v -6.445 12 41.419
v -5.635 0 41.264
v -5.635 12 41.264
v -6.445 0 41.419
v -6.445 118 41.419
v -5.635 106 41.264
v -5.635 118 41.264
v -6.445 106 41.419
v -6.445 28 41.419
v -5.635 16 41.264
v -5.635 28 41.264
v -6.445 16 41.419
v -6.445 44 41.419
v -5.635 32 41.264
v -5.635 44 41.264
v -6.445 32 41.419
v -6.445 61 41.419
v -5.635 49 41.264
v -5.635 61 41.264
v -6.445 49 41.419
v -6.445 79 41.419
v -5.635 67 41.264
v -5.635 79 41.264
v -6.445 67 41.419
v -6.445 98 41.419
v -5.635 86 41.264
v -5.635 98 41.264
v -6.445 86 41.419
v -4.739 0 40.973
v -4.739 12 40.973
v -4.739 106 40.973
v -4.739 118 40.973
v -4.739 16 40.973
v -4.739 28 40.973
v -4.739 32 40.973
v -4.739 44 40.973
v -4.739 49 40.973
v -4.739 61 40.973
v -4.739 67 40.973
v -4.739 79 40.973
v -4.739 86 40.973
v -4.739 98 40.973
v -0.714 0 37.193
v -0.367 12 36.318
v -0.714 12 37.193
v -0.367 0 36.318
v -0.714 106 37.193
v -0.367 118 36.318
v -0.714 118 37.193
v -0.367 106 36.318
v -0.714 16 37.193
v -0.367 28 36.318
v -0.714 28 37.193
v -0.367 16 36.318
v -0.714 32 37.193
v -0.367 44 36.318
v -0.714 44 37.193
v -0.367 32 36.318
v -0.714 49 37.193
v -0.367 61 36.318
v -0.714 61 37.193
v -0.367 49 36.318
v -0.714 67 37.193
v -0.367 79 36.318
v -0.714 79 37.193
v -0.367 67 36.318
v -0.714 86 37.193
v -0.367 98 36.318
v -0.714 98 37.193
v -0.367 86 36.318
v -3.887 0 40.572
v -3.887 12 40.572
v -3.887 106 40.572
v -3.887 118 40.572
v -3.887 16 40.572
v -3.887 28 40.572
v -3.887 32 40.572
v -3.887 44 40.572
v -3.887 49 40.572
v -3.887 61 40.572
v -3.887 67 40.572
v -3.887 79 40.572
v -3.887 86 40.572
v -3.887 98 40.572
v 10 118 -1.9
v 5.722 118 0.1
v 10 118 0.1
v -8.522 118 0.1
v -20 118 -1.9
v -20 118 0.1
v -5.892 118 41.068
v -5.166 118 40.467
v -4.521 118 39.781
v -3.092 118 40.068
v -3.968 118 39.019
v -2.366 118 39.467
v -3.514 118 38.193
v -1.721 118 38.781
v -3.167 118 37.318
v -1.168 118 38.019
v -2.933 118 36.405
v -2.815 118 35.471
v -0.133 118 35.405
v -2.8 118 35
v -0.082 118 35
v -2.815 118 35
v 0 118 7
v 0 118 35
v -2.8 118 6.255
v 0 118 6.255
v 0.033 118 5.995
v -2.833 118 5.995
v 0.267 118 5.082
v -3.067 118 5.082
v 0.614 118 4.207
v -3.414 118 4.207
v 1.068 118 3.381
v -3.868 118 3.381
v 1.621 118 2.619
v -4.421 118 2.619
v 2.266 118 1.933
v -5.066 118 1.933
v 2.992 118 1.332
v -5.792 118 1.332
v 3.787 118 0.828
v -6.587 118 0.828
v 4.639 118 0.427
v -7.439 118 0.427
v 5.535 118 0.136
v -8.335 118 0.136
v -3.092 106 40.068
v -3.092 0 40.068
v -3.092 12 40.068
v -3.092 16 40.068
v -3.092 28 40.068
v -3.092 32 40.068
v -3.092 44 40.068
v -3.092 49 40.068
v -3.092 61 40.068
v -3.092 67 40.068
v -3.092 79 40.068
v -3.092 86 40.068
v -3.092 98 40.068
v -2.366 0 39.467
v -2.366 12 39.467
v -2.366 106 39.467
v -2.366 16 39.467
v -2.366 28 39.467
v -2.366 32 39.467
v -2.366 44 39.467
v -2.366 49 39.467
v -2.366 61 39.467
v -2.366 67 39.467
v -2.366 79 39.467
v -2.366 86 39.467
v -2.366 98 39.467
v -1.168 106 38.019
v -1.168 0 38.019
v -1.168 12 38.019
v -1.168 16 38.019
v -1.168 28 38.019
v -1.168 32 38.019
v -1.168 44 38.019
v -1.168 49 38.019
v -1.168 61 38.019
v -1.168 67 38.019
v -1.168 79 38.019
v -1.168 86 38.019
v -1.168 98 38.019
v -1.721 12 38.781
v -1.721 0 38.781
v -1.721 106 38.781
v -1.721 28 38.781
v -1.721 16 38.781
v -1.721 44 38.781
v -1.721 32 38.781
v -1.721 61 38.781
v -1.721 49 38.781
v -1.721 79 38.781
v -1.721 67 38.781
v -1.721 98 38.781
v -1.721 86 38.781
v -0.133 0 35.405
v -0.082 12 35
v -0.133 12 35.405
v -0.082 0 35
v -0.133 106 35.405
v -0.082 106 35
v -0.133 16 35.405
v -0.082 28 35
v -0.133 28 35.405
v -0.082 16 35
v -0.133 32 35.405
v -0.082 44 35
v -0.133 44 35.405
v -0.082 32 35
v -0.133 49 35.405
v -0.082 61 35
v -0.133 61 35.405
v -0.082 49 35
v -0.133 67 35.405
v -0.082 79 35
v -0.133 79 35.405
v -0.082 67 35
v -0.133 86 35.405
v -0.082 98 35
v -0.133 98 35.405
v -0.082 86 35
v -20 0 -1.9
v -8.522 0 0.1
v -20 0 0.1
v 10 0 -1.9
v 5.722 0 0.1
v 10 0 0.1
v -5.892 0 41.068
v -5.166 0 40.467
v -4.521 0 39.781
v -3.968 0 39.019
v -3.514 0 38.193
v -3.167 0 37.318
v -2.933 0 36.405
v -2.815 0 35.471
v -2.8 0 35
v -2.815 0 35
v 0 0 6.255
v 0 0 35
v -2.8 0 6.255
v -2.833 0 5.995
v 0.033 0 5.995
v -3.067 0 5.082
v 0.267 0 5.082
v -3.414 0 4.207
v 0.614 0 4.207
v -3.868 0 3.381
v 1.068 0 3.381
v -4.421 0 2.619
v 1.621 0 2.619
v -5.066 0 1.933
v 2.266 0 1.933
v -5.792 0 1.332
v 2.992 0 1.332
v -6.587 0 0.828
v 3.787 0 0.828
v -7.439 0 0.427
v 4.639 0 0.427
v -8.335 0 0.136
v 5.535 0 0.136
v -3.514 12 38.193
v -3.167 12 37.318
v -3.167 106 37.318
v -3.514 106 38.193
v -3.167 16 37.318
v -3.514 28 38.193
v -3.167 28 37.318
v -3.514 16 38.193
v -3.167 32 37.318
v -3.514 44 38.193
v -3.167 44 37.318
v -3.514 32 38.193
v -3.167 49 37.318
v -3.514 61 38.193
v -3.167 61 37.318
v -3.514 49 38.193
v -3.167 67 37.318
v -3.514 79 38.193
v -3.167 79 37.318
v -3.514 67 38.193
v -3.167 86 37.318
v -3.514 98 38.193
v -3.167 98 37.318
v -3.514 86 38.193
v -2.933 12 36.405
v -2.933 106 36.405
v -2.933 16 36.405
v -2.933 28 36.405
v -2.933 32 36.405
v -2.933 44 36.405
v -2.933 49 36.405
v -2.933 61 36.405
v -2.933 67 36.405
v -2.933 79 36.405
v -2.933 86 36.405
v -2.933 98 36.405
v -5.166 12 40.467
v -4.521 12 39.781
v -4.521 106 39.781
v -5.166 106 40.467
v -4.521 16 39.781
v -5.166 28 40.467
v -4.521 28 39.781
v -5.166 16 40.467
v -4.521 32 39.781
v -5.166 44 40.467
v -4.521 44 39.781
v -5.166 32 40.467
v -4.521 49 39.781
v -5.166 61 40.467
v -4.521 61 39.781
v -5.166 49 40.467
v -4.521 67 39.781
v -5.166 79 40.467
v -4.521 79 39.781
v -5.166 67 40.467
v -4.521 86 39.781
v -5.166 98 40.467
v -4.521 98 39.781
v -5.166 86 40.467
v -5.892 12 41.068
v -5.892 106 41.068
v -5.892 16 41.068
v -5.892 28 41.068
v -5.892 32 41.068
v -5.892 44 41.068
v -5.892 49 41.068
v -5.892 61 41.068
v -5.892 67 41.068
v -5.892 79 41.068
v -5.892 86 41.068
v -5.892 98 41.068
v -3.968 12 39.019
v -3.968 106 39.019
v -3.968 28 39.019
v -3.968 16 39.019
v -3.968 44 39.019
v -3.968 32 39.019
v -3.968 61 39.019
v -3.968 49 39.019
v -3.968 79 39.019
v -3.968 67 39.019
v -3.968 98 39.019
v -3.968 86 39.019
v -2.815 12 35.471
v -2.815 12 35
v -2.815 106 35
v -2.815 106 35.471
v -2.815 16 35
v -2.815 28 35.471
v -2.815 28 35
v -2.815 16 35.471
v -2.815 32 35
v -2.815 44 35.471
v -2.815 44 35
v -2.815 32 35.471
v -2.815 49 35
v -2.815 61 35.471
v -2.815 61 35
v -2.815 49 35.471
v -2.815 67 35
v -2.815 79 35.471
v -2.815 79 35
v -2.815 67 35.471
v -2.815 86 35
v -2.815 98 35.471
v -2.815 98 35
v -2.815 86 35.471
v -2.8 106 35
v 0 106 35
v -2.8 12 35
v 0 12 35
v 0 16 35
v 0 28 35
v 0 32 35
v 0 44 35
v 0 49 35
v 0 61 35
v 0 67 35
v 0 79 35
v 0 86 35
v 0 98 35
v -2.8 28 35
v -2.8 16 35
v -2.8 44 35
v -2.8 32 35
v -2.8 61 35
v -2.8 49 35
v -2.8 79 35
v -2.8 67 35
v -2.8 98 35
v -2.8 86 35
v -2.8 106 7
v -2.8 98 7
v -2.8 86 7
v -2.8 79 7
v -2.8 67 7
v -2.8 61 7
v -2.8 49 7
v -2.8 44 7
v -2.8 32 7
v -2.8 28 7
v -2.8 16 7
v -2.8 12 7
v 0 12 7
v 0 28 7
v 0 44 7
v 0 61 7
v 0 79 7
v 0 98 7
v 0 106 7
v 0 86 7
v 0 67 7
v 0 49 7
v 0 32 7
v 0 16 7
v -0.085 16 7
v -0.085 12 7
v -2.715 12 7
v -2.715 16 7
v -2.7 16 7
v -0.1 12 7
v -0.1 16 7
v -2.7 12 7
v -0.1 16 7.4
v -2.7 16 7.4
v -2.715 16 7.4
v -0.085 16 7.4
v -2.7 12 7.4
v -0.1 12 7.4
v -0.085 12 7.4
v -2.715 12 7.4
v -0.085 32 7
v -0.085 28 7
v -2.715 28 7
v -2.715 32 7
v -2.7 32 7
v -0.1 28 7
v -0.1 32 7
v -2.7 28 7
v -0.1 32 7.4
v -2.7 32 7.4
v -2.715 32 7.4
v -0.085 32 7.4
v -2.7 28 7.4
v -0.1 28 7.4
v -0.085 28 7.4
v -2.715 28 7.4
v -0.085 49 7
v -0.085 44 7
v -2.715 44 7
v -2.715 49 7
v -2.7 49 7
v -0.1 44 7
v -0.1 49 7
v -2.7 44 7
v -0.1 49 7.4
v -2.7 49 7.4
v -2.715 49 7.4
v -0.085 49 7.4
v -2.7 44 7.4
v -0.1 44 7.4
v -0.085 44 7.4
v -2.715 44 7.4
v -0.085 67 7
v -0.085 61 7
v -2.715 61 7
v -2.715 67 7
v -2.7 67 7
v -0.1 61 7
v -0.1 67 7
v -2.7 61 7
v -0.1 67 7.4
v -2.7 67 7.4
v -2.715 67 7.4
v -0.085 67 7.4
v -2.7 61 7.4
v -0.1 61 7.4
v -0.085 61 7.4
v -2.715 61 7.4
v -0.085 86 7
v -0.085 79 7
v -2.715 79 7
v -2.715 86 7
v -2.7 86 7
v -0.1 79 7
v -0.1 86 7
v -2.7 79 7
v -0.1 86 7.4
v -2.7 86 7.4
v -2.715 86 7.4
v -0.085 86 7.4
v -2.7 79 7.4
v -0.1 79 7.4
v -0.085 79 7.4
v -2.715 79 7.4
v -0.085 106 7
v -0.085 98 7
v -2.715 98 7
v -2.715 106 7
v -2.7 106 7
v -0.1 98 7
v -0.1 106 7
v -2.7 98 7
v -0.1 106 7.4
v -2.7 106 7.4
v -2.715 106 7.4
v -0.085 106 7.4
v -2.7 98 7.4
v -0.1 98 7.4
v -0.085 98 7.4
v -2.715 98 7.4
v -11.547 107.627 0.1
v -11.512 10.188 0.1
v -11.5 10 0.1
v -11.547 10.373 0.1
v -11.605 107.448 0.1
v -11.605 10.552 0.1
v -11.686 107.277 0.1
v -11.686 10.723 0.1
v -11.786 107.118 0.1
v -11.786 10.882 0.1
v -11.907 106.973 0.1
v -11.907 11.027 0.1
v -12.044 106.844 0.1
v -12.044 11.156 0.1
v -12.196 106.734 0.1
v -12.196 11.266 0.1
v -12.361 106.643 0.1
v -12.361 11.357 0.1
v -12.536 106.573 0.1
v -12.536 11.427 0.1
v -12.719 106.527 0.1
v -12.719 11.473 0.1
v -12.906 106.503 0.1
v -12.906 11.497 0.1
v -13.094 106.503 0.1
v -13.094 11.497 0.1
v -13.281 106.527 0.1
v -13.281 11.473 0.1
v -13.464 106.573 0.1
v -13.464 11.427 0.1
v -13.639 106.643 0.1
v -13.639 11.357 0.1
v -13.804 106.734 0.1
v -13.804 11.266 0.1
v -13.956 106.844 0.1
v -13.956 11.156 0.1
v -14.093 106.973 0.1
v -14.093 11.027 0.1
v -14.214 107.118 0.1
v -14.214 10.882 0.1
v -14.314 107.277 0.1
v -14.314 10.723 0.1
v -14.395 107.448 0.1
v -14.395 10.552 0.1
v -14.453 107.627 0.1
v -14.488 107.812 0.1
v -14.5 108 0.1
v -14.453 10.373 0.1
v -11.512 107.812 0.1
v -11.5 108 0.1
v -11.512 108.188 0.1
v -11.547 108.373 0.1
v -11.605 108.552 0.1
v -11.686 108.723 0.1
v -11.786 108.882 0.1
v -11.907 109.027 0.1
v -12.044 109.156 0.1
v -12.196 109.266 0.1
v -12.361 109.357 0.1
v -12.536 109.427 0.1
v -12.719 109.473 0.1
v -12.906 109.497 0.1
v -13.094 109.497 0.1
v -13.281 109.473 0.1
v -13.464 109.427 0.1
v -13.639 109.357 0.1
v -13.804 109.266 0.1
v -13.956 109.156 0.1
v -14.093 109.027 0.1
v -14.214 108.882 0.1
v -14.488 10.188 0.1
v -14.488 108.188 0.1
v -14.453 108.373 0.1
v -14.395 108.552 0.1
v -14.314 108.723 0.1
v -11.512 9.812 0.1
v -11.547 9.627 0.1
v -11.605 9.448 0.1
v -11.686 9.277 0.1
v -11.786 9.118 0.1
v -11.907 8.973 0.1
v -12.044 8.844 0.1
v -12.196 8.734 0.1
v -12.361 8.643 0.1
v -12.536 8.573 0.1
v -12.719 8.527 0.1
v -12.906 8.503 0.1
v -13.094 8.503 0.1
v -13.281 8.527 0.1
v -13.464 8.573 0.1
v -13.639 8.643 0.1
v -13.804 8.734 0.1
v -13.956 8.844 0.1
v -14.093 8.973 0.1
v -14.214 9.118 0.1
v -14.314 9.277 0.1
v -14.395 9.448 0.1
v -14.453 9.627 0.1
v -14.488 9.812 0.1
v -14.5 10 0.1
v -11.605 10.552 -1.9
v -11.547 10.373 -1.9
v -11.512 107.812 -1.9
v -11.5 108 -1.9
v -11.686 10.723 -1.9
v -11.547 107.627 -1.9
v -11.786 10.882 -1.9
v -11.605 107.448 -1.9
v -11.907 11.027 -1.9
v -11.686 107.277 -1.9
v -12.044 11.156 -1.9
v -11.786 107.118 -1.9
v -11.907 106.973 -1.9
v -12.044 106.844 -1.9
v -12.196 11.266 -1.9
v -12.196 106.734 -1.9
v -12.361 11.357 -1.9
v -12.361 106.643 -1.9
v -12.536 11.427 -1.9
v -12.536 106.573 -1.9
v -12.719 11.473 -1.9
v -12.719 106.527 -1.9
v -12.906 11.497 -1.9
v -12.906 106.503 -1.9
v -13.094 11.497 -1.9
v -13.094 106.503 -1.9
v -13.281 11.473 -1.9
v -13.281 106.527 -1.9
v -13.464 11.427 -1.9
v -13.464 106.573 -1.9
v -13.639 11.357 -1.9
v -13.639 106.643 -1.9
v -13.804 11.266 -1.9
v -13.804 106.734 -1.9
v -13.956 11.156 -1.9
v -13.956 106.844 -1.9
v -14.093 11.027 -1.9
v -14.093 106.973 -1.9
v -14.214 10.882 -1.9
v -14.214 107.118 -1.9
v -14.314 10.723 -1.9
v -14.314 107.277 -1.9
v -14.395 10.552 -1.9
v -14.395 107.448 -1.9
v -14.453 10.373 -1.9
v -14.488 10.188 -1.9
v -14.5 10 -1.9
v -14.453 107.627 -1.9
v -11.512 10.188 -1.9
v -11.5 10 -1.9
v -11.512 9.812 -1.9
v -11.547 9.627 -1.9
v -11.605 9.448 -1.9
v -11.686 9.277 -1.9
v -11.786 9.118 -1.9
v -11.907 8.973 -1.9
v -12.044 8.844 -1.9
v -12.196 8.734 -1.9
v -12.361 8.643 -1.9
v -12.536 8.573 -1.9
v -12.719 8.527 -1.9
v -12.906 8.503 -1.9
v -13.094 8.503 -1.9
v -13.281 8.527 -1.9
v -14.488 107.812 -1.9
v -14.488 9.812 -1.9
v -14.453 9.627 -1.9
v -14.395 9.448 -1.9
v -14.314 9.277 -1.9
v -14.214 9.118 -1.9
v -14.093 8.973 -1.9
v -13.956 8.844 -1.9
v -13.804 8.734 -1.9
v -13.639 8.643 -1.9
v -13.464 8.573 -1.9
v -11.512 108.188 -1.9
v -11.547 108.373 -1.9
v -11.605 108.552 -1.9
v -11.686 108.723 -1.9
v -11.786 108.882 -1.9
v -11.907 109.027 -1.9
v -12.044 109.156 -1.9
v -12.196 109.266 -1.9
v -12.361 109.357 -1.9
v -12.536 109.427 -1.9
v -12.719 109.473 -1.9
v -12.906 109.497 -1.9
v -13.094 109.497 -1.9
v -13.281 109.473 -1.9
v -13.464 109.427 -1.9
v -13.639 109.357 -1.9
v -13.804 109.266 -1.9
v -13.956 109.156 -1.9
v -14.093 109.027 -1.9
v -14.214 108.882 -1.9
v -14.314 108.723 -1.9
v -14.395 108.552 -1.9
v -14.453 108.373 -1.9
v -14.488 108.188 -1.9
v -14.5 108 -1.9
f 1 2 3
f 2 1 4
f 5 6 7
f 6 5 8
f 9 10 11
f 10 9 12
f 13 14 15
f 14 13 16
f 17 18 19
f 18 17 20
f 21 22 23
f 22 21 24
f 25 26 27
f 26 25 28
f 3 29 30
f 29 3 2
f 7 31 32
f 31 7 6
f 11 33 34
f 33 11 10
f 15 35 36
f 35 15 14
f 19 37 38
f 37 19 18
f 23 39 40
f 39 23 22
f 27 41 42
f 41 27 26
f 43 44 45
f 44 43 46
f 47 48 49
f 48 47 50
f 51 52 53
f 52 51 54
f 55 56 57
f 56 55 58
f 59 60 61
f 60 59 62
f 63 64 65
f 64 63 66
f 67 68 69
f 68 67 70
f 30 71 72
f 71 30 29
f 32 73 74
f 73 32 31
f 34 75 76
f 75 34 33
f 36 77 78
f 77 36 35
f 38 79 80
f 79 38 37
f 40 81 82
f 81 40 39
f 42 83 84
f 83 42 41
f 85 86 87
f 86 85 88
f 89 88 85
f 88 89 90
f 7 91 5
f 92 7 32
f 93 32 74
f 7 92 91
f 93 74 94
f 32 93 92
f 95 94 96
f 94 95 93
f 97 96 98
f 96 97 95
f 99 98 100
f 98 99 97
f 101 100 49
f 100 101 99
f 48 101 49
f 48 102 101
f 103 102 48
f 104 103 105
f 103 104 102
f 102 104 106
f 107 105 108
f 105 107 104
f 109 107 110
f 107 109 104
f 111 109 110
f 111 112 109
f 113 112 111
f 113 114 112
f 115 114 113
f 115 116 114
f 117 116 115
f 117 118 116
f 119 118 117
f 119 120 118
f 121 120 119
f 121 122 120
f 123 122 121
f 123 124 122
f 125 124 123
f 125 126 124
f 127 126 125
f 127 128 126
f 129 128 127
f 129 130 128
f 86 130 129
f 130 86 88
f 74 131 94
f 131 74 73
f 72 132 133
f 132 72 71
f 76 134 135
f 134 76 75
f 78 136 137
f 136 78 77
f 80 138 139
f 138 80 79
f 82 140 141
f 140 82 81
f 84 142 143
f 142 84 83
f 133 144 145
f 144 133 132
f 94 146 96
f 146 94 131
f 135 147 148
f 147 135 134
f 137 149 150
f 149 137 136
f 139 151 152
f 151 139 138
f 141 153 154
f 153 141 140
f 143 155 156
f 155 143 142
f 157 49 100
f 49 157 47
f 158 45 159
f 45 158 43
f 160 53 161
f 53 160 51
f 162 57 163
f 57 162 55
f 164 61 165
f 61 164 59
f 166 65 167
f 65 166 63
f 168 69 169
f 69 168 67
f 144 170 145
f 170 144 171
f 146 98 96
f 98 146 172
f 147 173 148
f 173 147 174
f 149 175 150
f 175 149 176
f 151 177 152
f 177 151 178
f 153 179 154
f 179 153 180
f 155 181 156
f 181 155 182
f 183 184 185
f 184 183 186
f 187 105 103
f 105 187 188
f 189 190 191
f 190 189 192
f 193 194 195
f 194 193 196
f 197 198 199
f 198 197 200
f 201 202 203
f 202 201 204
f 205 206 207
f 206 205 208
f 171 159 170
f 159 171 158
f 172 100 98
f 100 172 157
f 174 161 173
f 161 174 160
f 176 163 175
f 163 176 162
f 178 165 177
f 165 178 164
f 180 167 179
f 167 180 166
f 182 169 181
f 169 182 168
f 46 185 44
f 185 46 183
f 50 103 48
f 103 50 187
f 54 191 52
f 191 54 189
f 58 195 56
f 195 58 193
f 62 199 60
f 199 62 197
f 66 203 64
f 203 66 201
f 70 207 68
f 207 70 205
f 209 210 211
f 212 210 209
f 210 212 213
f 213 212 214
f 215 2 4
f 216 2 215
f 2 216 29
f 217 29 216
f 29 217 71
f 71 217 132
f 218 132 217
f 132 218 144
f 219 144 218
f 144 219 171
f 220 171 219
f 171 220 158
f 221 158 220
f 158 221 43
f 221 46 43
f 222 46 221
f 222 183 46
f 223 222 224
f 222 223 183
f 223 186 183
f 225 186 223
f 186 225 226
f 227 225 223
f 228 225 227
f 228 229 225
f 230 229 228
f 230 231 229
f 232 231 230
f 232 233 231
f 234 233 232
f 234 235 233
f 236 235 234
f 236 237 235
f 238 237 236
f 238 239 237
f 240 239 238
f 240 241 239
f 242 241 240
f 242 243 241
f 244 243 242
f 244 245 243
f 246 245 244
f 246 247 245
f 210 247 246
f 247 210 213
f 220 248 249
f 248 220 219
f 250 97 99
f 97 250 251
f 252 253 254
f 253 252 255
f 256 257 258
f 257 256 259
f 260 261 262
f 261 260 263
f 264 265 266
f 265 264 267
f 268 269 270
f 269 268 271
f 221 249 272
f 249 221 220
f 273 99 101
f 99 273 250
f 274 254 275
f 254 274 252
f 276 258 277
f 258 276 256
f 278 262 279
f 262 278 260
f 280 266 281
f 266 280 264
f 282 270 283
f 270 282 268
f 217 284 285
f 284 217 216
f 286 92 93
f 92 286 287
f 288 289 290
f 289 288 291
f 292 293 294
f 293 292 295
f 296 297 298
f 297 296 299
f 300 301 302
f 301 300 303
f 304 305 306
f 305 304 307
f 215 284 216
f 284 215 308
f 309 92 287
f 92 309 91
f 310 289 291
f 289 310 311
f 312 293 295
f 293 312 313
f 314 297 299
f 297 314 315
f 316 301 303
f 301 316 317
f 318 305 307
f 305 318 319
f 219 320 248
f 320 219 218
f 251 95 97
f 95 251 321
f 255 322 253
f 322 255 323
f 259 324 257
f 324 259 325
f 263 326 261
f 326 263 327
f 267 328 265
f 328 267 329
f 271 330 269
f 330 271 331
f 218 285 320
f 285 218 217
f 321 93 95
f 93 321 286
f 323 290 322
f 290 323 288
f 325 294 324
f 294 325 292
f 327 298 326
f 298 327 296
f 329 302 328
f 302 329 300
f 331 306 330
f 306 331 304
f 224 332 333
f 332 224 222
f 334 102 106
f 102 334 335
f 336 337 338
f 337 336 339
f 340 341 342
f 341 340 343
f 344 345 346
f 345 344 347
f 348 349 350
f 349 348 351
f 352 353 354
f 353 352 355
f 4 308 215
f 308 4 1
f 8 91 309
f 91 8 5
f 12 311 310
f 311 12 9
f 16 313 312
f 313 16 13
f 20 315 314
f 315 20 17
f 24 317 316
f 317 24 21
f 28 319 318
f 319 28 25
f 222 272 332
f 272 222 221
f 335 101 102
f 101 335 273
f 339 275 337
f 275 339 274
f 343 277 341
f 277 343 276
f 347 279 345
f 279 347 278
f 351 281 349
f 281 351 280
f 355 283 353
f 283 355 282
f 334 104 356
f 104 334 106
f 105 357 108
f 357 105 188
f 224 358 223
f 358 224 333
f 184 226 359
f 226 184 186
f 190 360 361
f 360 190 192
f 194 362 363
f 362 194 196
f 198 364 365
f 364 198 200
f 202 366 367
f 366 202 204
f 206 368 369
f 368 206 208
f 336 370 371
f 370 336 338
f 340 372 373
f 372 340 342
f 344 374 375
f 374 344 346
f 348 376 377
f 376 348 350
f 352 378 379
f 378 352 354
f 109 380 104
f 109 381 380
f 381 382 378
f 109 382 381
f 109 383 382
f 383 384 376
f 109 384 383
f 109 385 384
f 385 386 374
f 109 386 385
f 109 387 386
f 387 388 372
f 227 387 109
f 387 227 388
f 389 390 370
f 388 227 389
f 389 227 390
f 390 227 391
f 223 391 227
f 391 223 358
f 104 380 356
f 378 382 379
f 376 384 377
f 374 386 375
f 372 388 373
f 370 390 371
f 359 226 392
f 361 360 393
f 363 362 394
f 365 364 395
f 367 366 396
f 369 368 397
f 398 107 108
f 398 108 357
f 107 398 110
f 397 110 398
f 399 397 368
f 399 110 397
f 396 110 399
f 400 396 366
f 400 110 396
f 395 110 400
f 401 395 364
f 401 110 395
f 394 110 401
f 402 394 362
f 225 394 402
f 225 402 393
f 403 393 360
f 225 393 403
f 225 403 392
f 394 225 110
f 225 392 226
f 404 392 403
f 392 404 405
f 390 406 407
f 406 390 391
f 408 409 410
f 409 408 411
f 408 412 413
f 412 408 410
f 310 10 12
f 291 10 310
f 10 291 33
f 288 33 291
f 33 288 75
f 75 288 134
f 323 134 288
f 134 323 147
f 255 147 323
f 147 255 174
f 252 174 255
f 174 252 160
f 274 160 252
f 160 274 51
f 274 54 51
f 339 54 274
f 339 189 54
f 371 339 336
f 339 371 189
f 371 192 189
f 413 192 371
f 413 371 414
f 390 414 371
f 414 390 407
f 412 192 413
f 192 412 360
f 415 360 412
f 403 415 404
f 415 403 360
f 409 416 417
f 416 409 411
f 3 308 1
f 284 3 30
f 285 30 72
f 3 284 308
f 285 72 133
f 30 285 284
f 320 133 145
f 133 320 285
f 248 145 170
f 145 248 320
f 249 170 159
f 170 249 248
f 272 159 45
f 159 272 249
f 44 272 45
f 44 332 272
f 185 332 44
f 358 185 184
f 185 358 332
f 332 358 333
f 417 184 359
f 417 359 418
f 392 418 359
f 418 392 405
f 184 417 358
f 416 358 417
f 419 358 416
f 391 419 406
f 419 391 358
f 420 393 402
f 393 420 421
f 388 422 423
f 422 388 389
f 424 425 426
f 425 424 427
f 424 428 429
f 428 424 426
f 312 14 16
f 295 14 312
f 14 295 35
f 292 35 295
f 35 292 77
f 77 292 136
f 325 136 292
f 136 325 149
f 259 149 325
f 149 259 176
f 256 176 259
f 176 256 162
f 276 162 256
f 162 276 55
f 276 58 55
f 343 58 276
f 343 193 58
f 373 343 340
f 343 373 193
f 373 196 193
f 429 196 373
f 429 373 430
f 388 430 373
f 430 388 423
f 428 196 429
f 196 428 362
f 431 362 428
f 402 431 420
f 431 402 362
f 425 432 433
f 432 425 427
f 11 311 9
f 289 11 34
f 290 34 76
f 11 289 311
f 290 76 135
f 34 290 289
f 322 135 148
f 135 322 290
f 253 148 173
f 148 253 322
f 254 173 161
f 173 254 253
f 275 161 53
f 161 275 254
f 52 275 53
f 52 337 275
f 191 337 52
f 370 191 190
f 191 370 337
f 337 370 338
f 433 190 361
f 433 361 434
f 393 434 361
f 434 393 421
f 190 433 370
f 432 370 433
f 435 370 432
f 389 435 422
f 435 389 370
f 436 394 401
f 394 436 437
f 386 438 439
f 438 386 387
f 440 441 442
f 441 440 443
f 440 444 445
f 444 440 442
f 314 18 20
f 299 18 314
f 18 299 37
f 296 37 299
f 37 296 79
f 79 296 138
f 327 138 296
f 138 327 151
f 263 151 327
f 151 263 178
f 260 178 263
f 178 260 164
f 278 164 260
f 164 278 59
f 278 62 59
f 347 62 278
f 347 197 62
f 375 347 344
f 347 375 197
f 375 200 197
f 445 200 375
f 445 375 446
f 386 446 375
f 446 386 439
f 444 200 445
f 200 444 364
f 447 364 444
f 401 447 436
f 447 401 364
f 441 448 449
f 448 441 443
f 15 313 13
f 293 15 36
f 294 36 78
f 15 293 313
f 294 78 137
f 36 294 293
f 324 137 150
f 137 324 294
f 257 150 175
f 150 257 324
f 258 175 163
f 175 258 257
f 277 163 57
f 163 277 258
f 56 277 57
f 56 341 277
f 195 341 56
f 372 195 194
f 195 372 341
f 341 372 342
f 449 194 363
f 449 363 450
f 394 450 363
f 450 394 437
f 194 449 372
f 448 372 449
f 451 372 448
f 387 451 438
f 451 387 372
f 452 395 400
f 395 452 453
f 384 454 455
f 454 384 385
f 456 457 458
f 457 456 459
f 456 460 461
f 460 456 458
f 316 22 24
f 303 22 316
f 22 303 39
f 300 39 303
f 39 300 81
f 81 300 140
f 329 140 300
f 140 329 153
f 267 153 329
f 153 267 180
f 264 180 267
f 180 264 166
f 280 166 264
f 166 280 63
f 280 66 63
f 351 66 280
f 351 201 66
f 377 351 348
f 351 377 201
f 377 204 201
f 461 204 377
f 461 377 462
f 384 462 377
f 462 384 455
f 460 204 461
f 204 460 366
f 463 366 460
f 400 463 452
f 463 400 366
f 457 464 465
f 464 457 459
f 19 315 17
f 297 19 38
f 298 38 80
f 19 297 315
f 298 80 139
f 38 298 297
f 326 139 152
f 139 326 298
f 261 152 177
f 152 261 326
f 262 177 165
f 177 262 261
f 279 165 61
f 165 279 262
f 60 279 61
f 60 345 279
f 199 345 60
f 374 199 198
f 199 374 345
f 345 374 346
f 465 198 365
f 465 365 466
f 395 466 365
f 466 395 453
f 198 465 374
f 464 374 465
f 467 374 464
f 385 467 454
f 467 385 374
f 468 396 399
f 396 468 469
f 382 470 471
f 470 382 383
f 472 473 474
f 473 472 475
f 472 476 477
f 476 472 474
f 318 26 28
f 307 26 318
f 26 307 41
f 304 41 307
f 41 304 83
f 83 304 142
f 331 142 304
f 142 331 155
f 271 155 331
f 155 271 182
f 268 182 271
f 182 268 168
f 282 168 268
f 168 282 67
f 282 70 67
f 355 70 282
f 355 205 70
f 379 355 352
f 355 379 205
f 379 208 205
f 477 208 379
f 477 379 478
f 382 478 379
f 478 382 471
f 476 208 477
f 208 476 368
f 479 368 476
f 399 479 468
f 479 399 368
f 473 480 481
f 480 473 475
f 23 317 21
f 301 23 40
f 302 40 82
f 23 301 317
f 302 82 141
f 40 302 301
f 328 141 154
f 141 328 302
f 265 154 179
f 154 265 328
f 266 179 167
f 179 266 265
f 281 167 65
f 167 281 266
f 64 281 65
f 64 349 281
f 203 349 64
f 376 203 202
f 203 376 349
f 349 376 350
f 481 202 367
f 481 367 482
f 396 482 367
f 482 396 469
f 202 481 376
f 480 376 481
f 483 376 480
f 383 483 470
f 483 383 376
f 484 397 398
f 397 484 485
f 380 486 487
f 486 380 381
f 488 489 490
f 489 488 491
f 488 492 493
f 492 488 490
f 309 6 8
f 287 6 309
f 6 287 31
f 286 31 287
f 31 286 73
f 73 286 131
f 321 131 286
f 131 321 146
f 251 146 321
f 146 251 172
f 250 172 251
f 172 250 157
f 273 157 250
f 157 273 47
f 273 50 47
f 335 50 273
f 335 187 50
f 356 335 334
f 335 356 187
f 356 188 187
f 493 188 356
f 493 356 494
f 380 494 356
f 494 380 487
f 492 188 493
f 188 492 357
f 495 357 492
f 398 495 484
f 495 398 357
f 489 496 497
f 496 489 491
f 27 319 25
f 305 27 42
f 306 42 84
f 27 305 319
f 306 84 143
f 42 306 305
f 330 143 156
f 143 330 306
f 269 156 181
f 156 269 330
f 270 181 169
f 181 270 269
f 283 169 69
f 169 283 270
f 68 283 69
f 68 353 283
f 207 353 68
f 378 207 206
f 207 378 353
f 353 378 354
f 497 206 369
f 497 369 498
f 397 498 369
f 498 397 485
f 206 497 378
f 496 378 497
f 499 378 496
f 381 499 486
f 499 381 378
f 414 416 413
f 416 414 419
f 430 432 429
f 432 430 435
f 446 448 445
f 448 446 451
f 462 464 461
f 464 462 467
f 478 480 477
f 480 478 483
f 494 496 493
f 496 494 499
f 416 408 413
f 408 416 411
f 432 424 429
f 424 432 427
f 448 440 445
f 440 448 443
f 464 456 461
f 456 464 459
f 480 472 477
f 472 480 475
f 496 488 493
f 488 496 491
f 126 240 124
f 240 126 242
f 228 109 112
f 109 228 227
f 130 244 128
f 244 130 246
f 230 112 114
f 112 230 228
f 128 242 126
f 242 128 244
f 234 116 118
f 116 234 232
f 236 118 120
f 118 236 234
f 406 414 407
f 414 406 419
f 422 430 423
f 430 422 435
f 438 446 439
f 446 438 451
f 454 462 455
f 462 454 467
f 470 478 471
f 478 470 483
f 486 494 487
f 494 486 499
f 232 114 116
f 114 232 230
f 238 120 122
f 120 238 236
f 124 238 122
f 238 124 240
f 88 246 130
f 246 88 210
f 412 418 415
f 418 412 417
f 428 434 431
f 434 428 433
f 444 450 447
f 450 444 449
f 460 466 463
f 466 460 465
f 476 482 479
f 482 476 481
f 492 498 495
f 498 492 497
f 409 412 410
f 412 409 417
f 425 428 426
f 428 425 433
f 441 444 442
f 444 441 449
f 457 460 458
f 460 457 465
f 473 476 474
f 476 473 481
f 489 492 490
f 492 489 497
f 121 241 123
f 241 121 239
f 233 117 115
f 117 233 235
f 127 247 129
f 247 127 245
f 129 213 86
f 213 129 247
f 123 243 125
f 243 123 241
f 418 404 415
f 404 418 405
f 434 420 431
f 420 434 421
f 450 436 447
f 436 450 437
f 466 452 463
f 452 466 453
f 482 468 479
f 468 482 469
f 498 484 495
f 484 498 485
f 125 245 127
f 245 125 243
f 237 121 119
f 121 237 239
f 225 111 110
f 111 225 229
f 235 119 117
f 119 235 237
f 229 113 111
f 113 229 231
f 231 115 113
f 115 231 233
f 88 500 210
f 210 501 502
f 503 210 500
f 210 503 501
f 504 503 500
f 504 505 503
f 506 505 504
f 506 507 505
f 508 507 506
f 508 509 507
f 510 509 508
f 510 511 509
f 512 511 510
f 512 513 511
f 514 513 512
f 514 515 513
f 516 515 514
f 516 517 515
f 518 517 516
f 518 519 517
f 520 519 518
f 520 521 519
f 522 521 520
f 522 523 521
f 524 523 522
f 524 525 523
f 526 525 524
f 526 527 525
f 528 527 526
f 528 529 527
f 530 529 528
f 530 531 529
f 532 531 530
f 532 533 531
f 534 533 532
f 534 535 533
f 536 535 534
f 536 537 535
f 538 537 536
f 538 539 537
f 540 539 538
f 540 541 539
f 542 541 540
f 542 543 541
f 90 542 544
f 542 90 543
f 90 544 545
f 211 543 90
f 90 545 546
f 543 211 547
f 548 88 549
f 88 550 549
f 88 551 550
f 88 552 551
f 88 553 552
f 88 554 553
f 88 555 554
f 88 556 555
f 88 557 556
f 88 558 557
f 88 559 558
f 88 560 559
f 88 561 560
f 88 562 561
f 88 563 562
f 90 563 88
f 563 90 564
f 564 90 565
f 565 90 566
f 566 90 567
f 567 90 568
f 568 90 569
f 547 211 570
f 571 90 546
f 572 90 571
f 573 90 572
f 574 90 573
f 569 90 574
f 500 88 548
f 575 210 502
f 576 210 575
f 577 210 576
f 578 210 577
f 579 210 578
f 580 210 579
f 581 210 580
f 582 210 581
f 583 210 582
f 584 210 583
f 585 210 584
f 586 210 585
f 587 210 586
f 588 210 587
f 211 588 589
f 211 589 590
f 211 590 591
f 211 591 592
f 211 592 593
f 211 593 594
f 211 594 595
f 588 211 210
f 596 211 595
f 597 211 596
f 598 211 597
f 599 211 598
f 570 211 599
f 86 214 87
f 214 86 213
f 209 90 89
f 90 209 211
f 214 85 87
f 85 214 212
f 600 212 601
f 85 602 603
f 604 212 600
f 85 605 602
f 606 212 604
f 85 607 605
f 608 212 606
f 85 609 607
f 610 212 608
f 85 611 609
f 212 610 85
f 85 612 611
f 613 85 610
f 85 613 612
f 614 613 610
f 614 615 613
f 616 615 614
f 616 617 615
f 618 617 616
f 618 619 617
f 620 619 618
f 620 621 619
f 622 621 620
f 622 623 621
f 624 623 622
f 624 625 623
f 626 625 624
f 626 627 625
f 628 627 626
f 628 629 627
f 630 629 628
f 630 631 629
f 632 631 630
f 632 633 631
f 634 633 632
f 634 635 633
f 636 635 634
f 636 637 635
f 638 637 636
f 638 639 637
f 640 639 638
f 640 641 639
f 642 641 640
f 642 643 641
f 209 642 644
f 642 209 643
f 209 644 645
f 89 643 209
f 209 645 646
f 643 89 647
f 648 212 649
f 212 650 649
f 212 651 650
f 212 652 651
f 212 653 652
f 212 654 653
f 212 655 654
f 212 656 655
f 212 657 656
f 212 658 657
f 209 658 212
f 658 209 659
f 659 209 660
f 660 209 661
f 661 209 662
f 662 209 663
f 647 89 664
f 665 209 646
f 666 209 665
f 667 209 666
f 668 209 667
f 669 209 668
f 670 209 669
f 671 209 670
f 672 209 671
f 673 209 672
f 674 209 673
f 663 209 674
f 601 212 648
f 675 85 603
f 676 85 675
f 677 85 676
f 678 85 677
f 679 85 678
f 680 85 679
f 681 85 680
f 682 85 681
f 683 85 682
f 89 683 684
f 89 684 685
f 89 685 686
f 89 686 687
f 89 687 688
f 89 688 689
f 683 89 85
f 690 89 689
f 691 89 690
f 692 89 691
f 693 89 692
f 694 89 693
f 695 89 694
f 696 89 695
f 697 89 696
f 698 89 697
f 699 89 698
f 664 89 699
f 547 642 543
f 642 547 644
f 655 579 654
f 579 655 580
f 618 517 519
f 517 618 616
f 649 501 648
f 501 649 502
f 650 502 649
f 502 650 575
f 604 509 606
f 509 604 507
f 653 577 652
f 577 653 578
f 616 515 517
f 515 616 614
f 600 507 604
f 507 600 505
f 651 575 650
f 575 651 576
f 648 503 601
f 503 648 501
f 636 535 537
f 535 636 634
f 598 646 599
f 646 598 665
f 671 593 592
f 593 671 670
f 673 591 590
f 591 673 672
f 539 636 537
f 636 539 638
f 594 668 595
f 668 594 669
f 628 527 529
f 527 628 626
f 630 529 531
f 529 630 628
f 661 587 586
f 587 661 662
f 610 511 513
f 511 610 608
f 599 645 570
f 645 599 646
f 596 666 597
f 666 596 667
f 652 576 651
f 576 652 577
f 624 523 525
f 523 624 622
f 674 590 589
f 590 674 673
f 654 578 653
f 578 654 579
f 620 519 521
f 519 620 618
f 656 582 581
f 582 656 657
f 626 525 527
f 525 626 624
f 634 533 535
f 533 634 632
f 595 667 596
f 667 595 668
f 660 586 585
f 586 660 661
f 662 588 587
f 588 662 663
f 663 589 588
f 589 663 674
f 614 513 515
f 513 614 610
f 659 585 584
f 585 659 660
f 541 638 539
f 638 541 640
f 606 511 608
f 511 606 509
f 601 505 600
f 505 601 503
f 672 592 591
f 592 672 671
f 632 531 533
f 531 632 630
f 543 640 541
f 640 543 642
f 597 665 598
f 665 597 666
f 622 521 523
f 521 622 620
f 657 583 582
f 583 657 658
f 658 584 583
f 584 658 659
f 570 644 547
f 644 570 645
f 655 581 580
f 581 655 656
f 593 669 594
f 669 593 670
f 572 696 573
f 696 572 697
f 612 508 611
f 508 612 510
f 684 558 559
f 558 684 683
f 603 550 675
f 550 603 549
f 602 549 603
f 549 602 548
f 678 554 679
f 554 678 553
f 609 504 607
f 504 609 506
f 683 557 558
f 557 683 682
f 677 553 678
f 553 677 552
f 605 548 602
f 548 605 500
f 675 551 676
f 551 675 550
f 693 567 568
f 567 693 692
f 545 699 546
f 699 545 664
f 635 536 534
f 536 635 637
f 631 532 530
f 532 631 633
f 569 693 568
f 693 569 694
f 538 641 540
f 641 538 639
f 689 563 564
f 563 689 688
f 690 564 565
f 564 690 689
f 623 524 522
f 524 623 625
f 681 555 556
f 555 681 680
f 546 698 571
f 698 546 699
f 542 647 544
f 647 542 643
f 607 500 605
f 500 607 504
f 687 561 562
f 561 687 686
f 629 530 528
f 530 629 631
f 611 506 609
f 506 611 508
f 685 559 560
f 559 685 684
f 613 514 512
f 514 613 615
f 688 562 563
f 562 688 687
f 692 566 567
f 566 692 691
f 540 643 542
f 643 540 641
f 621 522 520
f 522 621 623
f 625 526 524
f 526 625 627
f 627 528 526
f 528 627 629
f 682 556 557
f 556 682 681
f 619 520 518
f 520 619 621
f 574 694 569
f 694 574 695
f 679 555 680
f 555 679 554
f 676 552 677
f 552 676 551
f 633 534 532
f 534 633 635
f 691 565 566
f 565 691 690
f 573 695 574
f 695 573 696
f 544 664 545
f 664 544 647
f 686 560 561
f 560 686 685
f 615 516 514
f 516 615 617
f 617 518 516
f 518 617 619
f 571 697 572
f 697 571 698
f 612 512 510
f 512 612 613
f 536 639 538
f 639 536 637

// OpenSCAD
$fn = 50;

slots = [4,4,5,6,7,8];

gap = 12;

height = 2.8;

wallDepth = 2;
wallHeight = 30;

tipDia = 15;
conDia = 7.5;

width = 35;
length = sum(slots, len(slots)) + (len(slots) + 1) * gap;
echo(length);

rotate([0,-90,0])
holder();


module holder(){
    
    difference(){
    
        union(){
            arm();
            
            translate([-wallDepth + 0.1,0, - wallHeight/3])
            cube([wallDepth,length,wallHeight]);
            
            translate([-0.1,0,height-0.1])
            difference(){
                
                cube([conDia,length,conDia]);
                
                translate([conDia,-1,conDia])
                rotate([-90,0,0])
                cylinder(r = conDia, h = length +2);
                
            }
            
            translate([-0.1,0,-conDia+0.1])
            difference(){
                
                cube([conDia,length,conDia]);
                
                translate([conDia,-1,0])
                rotate([-90,0,0])
                cylinder(r = conDia, h = length +2);
                
            }
            
        }
        
        translate([-5,10, wallHeight/3+3])
        rotate([0,90,0])
        cylinder(d = 3, h = 10);
        
        translate([-5,length - 10, wallHeight/3+3])
        rotate([0,90,0])
        cylinder(d = 3, h = 10);
    }
    
}


module arm(){
    
    difference(){
        armBlock();
        
        for(i = [0:len(slots)]){
            
            translate([7,gap + sum(slots,i) + gap * i,-1])
            cube([width + 20, slots[i], 10]);
            
        }
        
    }
    
}


module armBlock(){
    
    
    union(){
        
        cube([width, length, height]);
        
        translate([width-1,0,tipDia/2])
        difference(){
            
            rotate([-90,0,0])
            cylinder(d = tipDia, h = length);
            
            translate([1,-1,height])
            rotate([-90,0,0])
            cylinder(d = tipDia, h = length+2);
            
            translate([-20,-1,-20])
            cube([21,length + 2, 40]);
            
        }
        
    }
}


function sum(v, to, i = 0) =
    (i < to ? v[i] + sum(v, to, i+1) : 0);
